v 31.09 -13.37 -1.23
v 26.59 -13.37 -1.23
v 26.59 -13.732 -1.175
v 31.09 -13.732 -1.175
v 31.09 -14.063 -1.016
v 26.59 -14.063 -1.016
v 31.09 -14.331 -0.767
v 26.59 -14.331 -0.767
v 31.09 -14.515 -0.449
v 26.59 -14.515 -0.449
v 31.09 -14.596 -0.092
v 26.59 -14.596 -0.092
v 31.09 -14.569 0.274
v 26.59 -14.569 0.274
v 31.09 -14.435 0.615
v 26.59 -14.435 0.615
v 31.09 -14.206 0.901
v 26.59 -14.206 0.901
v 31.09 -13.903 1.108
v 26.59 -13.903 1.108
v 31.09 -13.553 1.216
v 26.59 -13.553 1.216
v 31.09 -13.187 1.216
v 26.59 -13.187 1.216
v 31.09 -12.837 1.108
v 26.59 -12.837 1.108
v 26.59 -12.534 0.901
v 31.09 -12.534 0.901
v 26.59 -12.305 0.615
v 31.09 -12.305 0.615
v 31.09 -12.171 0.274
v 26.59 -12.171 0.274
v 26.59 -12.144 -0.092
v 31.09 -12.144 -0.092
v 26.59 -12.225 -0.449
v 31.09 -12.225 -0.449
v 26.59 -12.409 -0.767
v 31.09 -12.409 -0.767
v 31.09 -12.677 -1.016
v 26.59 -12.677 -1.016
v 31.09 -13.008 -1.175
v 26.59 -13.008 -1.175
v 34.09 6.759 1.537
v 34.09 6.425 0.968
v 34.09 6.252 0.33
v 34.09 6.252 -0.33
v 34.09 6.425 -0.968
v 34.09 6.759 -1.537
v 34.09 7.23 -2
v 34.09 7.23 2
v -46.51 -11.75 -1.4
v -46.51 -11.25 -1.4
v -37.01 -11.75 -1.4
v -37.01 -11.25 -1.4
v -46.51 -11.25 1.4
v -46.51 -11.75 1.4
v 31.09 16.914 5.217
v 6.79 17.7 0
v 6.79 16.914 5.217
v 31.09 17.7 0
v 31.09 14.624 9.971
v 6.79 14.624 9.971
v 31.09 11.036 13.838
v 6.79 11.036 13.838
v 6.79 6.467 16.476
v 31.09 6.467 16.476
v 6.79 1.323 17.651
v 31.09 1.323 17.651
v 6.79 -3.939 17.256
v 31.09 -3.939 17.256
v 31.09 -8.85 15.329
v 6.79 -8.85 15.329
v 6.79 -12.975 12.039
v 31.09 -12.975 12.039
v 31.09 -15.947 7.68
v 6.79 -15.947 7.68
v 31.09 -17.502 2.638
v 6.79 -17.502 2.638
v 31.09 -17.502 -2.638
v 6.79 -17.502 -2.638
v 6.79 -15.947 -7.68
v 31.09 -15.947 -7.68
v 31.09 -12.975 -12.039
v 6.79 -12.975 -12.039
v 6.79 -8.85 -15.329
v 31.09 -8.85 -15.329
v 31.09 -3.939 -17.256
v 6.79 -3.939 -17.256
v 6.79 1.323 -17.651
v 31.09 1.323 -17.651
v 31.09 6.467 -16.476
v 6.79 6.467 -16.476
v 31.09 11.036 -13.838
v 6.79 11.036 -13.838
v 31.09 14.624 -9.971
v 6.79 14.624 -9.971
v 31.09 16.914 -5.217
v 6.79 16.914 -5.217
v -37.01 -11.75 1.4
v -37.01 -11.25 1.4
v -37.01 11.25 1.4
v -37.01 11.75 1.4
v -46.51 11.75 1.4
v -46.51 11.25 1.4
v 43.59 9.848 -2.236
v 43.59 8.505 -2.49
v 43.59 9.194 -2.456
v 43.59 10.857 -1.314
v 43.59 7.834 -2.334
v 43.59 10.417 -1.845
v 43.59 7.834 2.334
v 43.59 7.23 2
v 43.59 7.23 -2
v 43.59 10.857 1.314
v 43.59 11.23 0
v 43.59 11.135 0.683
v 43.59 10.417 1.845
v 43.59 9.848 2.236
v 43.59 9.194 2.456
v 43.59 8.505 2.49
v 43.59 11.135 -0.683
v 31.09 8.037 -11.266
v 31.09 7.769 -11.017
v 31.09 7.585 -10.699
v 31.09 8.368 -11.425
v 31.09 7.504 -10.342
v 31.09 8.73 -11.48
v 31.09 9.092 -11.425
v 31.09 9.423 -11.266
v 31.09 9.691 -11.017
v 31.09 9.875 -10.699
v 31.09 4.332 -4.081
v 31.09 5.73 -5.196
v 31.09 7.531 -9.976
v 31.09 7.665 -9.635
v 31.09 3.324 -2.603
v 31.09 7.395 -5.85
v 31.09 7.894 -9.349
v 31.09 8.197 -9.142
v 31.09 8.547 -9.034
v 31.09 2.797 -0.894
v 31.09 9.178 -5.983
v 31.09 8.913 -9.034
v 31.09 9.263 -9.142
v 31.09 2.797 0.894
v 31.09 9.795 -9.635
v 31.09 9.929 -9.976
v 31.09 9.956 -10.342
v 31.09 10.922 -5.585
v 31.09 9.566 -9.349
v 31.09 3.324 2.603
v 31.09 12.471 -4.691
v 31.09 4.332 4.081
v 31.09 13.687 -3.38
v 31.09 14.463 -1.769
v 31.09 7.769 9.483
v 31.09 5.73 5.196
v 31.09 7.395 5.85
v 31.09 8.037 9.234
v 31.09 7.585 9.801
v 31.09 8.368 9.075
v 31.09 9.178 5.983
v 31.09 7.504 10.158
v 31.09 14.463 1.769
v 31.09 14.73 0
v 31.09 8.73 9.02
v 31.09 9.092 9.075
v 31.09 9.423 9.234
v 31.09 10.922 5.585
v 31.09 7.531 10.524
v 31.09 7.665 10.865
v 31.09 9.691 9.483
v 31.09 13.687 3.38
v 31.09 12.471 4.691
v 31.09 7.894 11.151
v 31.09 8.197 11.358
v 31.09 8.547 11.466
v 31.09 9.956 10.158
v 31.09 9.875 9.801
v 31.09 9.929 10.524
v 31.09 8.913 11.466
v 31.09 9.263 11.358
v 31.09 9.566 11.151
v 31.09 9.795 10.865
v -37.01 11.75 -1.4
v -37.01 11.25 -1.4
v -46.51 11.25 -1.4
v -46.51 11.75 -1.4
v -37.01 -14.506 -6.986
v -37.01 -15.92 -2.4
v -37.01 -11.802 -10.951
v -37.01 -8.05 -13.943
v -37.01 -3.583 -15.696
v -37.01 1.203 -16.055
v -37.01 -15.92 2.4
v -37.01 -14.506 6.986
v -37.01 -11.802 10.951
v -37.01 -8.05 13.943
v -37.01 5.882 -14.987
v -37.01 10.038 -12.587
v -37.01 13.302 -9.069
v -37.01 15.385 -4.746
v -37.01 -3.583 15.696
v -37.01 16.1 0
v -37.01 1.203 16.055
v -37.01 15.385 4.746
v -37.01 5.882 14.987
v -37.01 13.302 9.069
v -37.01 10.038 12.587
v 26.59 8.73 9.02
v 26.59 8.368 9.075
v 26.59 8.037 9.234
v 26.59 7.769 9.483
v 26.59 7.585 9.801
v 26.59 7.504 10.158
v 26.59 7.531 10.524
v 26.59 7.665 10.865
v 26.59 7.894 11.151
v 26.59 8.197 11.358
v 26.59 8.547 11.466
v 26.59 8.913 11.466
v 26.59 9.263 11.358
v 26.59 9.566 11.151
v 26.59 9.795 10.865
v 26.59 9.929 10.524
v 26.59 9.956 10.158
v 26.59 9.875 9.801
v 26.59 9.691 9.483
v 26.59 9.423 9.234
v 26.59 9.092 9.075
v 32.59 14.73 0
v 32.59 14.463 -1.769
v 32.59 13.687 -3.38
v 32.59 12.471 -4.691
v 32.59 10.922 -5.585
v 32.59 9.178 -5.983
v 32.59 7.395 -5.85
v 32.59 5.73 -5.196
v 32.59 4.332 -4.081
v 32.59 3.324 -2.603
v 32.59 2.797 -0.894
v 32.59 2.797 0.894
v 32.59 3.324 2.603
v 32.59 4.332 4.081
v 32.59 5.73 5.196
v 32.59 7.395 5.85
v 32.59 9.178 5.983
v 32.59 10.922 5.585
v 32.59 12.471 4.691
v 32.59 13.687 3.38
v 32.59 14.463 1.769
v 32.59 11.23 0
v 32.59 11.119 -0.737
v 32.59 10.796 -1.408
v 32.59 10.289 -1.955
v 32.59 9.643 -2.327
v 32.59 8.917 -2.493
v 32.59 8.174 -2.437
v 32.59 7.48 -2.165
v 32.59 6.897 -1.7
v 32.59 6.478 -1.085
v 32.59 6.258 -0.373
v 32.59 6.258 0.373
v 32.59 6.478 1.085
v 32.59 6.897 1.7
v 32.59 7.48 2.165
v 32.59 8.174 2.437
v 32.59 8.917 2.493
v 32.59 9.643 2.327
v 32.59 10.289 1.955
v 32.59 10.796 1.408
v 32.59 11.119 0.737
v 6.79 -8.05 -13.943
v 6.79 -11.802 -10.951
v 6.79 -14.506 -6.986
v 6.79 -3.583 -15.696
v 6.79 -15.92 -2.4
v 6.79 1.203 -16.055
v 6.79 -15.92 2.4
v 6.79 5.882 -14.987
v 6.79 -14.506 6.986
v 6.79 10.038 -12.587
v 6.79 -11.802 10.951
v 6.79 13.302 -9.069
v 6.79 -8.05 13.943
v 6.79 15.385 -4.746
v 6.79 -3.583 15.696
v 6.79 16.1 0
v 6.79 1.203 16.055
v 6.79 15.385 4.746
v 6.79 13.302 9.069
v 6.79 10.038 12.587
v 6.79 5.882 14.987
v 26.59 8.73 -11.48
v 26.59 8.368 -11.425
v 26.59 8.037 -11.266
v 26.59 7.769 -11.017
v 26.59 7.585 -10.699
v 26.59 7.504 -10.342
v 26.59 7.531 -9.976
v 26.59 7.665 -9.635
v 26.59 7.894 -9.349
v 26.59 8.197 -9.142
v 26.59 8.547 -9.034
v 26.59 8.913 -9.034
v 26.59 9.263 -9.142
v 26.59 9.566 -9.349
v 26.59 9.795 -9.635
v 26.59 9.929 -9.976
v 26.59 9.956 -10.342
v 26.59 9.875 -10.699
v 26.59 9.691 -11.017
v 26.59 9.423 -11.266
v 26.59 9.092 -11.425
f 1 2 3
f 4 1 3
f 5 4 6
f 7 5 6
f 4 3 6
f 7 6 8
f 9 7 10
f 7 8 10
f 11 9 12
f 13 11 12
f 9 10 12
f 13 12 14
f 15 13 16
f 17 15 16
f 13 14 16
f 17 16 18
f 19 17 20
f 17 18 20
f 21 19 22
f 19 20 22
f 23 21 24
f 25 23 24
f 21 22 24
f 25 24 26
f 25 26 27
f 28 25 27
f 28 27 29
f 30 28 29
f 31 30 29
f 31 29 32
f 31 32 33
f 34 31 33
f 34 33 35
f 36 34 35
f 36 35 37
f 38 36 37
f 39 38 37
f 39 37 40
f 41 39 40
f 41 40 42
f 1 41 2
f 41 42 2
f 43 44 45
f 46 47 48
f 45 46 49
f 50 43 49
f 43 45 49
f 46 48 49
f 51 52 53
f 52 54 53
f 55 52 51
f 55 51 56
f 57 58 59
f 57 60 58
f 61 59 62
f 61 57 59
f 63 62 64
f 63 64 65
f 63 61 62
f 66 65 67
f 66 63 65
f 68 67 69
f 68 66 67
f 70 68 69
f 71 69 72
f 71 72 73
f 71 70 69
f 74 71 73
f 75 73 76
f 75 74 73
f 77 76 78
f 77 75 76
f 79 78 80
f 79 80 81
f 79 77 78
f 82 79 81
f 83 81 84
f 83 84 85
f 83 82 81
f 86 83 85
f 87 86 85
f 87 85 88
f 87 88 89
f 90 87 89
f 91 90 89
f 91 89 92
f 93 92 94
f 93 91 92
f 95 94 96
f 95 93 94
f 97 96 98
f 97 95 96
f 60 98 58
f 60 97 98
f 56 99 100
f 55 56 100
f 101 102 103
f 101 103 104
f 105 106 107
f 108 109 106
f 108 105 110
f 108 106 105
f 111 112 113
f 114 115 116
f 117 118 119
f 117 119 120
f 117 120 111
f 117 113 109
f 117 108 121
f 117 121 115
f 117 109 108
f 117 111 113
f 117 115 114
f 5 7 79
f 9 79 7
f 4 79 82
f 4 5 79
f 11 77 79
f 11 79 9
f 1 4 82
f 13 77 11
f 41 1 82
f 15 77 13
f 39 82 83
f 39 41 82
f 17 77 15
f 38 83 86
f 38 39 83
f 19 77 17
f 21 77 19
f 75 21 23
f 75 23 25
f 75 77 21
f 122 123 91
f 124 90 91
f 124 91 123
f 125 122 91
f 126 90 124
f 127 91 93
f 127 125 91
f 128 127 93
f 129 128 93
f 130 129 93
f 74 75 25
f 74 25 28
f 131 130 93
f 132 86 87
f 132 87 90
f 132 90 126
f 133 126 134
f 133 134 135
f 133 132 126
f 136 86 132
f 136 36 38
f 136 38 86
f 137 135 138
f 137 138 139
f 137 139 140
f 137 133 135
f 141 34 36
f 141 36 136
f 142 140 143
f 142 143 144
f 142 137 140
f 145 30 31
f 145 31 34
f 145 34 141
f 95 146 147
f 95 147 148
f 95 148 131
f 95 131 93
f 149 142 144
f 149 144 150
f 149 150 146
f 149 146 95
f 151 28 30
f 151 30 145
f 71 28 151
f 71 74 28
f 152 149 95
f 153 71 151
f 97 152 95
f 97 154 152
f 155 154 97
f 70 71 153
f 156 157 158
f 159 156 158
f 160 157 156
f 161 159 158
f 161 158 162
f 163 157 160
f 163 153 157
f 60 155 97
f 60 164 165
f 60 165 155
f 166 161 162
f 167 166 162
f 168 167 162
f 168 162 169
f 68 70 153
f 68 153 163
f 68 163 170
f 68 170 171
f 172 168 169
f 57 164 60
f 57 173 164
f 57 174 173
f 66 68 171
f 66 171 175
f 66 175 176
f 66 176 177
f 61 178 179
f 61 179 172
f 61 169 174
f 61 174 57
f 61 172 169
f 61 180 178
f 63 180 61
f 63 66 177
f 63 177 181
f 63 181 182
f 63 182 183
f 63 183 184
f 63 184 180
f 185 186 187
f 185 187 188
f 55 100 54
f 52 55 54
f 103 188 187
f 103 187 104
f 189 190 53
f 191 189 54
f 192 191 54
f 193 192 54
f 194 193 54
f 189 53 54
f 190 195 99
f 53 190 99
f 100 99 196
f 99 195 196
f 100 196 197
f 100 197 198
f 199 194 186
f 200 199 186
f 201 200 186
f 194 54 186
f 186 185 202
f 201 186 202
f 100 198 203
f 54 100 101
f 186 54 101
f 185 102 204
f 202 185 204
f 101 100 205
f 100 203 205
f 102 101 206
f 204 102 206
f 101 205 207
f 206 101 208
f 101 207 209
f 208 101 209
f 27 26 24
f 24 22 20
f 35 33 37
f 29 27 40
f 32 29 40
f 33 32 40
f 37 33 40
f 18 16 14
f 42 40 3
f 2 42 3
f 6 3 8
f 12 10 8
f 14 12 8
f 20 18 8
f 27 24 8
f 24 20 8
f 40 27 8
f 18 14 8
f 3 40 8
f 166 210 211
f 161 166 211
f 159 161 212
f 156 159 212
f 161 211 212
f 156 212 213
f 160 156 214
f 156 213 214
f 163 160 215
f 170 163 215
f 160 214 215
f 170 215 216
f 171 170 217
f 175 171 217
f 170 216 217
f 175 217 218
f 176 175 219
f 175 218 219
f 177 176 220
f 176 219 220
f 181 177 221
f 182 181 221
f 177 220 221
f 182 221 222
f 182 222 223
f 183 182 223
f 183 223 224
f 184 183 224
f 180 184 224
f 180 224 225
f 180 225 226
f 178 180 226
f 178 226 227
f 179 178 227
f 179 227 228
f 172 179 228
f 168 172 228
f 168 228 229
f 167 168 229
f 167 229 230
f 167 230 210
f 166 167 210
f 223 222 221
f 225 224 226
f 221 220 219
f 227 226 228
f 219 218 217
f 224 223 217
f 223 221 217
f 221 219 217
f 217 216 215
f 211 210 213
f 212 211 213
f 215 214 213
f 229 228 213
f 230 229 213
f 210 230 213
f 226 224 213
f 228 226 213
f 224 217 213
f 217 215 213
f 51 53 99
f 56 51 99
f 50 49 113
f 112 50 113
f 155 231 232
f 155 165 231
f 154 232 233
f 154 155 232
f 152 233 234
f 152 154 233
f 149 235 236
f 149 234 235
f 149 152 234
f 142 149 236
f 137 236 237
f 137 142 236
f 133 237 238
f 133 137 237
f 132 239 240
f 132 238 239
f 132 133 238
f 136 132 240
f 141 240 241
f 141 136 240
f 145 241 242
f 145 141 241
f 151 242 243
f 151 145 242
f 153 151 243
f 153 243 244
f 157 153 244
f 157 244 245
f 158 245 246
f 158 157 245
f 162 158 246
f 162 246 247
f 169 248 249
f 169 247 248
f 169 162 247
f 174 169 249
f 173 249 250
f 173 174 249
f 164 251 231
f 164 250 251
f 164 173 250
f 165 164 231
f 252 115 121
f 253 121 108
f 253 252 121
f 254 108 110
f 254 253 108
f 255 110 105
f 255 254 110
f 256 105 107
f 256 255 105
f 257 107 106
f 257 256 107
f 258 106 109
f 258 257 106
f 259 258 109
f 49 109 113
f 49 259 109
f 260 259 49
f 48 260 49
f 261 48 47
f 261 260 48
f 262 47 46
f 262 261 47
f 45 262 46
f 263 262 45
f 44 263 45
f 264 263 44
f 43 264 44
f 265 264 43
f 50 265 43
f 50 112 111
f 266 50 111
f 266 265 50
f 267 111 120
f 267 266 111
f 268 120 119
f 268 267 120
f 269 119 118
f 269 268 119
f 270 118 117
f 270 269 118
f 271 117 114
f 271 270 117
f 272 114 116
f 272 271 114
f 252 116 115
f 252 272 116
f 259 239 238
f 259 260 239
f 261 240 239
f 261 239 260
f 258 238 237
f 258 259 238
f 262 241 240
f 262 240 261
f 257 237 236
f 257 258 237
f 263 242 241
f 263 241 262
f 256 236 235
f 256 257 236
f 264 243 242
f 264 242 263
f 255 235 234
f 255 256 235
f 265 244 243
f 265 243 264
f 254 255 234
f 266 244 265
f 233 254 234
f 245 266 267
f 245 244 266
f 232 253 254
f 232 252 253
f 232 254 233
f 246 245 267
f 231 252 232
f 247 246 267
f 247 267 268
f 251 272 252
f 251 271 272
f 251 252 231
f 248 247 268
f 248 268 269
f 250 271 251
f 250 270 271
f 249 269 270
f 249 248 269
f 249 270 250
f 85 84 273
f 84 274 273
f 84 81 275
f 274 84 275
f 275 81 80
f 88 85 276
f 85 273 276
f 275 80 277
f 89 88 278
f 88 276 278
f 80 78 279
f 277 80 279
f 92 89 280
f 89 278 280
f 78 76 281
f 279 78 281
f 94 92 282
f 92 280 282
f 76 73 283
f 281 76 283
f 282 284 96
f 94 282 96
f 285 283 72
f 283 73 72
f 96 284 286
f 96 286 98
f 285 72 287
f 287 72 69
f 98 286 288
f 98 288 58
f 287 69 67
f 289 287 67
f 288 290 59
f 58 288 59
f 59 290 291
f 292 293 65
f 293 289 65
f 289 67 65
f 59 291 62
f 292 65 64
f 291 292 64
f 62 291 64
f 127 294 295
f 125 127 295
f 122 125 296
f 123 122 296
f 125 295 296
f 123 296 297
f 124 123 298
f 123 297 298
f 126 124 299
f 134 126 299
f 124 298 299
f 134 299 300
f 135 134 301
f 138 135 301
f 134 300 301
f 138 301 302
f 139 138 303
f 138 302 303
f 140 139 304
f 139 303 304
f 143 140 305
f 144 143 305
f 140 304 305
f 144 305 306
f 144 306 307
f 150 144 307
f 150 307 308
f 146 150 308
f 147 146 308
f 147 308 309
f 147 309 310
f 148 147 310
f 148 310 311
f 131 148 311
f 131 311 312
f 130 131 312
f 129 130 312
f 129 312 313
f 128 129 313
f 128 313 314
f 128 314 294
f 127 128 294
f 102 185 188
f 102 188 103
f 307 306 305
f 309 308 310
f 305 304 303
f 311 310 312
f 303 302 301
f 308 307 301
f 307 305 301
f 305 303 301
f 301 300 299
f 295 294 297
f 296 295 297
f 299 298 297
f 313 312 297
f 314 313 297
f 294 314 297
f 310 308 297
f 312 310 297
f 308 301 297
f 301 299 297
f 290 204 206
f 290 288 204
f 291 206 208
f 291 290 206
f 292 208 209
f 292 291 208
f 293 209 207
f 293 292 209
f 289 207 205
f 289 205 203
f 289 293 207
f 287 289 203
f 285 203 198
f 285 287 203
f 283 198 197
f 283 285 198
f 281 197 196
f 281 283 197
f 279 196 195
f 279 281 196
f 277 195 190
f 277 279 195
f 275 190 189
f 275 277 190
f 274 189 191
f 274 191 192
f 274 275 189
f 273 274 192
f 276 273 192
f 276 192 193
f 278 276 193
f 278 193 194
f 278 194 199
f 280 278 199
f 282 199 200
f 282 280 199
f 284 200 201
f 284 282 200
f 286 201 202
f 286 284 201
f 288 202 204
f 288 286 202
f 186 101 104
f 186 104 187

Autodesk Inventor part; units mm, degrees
ref_plane "YZ Plane" through (0, 0, 0) normal (1, 0, 0) x (0, 1, 0)
ref_plane "XZ Plane" through (0, 0, 0) normal (0, 1, 0) x (-1, 0, 0)
ref_plane "XY Plane" through (0, 0, 0) normal (0, 0, 1) x (1, 0, 0)
sketch "Sketch1" plane through (0, 0, 0) normal (0, 0, 1) x (1, 0, 0)
  line L0 (-37.0102, 0) -> (-37.0102, 16.1)
  line L1 (-37.0102, 16.1) -> (6.7898, 16.1)
  line L2 (6.7898, 16.1) -> (6.7898, 17.7)
  line L3 (6.7898, 17.7) -> (31.0898, 17.7)
  line L4 (31.0898, 17.7) -> (31.0898, 0)
  line L5 (31.0898, 0) -> (-37.0102, 0)
  line L6 (-42.8743, 0) -> (48.8507, 0) construction
  line L7 (0, 23.2775) -> (0, -29.7437) construction
  point P0 (0, 0)
  dimension "d0" = 16.1
  dimension "d1" = 68.1
  dimension "d2" = 24.3
  dimension "d3" = 17.7
revolve "Revolution1" add sketch "Sketch1" angle 360 about axis through (-42.8743, 0, 0) along (1, 0, 0)
sketch "Sketch2" plane through (31.0898, 0, 0) normal (1, 0, 0) x (0, 0, -1)
  point P0 (0, 0)
  point P1 (0, 8.73)
  dimension "d5" = 8.73
sketch "Sketch3" plane through (0, 0, 0) normal (0, 0, 1) x (1, 0, 0)
  line L0 (31.0898, 8.73) -> (43.5898, 8.73)
  line L1 (43.5898, 8.73) -> (43.5898, 11.23)
  line L2 (43.5898, 11.23) -> (32.5898, 11.23)
  line L3 (32.5898, 11.23) -> (32.5898, 14.73)
  line L4 (32.5898, 14.73) -> (31.0898, 14.73)
  line L5 (31.0898, 14.73) -> (31.0898, 8.73)
  line L6 (24.3312, 8.73) -> (72.9935, 8.73) construction
  line L7 (6.7898, -17.7) -> (6.7898, 17.7) construction
  point P0 (0, 0)
  dimension "d6" = 6
  dimension "d8" = 2.5
  dimension "d9" = 1.5
  dimension "d10" = 12.5
revolve "Revolution2" add sketch "Sketch3" angle 360 about axis through (24.3312, 8.73, 0) along (1, 0, 0)
sketch "Sketch4" plane through (0, 0, 0) normal (0, 0, 1) x (1, 0, 0)
  line L0 (32.5898, 6.23) -> (43.5898, 6.23) projected
  line L1 (43.5898, 6.23) -> (34.0898, 6.23)
  line L2 (34.0898, 6.23) -> (34.0898, 7.23)
  line L3 (34.0898, 7.23) -> (43.5898, 7.23)
  line L4 (43.5898, 7.23) -> (43.5898, 6.23)
  point P0 (0, 0)
  dimension "d12" = 1
  dimension "d13" = 9.5
extrude "Extrusion1" cut sketch "Sketch4" along normal mid plane 10
sketch "Sketch5" plane through (31.0898, 0, 0) normal (1, 0, 0) x (0, 0, -1)
  line L0 (0, -24.78) -> (0, 24.78) projected
  line L1 (-24.78, 0) -> (24.78, 0) projected
  point P0 (0, 0)
  point P1 (-10.25, 8.73)
  point P2 (10.25, 8.73)
  point P3 (0, -13.37)
  dimension "d16" = 20.5
  dimension "d17" = 8.73
  dimension "d18" = 22.1
hole "Hole1" at (31.0898, 8.73, 10.25) at (31.0898, 8.73, -10.25) at (31.0898, -13.37, 0) direction (-1, 0, 0) diameter 2.459 depth 4.5 thread size "M3x0.5" class "6H" standard "ISO Metric profile"
sketch "Sketch6" plane through (-37.0102, 0, 0) normal (-1, 0, 0) x (0, 0, 1)
  line L0 (0, 24.78) -> (0, -24.78) projected
  line L1 (-24.78, 0) -> (24.78, 0) projected
  line L2 (-1.4, 11.75) -> (1.4, 11.75)
  line L3 (1.4, 11.75) -> (1.4, 11.25)
  line L4 (1.4, 11.25) -> (-1.4, 11.25)
  line L5 (-1.4, 11.25) -> (-1.4, 11.75)
  line L6 (-1.4, -11.75) -> (1.4, -11.75)
  line L7 (1.4, -11.75) -> (1.4, -11.25)
  line L8 (1.4, -11.25) -> (-1.4, -11.25)
  line L9 (-1.4, -11.25) -> (-1.4, -11.75)
  point P0 (0, 0)
  point P1 (0, 11.25)
  point P2 (0, -11.25)
  dimension "d26" = 2.8
  dimension "d27" = 0.5
  dimension "d28" = 11.25
extrude "Extrusion2" add sketch "Sketch6" along normal blind 9.5
properties material "Thermoplastic Resin"
